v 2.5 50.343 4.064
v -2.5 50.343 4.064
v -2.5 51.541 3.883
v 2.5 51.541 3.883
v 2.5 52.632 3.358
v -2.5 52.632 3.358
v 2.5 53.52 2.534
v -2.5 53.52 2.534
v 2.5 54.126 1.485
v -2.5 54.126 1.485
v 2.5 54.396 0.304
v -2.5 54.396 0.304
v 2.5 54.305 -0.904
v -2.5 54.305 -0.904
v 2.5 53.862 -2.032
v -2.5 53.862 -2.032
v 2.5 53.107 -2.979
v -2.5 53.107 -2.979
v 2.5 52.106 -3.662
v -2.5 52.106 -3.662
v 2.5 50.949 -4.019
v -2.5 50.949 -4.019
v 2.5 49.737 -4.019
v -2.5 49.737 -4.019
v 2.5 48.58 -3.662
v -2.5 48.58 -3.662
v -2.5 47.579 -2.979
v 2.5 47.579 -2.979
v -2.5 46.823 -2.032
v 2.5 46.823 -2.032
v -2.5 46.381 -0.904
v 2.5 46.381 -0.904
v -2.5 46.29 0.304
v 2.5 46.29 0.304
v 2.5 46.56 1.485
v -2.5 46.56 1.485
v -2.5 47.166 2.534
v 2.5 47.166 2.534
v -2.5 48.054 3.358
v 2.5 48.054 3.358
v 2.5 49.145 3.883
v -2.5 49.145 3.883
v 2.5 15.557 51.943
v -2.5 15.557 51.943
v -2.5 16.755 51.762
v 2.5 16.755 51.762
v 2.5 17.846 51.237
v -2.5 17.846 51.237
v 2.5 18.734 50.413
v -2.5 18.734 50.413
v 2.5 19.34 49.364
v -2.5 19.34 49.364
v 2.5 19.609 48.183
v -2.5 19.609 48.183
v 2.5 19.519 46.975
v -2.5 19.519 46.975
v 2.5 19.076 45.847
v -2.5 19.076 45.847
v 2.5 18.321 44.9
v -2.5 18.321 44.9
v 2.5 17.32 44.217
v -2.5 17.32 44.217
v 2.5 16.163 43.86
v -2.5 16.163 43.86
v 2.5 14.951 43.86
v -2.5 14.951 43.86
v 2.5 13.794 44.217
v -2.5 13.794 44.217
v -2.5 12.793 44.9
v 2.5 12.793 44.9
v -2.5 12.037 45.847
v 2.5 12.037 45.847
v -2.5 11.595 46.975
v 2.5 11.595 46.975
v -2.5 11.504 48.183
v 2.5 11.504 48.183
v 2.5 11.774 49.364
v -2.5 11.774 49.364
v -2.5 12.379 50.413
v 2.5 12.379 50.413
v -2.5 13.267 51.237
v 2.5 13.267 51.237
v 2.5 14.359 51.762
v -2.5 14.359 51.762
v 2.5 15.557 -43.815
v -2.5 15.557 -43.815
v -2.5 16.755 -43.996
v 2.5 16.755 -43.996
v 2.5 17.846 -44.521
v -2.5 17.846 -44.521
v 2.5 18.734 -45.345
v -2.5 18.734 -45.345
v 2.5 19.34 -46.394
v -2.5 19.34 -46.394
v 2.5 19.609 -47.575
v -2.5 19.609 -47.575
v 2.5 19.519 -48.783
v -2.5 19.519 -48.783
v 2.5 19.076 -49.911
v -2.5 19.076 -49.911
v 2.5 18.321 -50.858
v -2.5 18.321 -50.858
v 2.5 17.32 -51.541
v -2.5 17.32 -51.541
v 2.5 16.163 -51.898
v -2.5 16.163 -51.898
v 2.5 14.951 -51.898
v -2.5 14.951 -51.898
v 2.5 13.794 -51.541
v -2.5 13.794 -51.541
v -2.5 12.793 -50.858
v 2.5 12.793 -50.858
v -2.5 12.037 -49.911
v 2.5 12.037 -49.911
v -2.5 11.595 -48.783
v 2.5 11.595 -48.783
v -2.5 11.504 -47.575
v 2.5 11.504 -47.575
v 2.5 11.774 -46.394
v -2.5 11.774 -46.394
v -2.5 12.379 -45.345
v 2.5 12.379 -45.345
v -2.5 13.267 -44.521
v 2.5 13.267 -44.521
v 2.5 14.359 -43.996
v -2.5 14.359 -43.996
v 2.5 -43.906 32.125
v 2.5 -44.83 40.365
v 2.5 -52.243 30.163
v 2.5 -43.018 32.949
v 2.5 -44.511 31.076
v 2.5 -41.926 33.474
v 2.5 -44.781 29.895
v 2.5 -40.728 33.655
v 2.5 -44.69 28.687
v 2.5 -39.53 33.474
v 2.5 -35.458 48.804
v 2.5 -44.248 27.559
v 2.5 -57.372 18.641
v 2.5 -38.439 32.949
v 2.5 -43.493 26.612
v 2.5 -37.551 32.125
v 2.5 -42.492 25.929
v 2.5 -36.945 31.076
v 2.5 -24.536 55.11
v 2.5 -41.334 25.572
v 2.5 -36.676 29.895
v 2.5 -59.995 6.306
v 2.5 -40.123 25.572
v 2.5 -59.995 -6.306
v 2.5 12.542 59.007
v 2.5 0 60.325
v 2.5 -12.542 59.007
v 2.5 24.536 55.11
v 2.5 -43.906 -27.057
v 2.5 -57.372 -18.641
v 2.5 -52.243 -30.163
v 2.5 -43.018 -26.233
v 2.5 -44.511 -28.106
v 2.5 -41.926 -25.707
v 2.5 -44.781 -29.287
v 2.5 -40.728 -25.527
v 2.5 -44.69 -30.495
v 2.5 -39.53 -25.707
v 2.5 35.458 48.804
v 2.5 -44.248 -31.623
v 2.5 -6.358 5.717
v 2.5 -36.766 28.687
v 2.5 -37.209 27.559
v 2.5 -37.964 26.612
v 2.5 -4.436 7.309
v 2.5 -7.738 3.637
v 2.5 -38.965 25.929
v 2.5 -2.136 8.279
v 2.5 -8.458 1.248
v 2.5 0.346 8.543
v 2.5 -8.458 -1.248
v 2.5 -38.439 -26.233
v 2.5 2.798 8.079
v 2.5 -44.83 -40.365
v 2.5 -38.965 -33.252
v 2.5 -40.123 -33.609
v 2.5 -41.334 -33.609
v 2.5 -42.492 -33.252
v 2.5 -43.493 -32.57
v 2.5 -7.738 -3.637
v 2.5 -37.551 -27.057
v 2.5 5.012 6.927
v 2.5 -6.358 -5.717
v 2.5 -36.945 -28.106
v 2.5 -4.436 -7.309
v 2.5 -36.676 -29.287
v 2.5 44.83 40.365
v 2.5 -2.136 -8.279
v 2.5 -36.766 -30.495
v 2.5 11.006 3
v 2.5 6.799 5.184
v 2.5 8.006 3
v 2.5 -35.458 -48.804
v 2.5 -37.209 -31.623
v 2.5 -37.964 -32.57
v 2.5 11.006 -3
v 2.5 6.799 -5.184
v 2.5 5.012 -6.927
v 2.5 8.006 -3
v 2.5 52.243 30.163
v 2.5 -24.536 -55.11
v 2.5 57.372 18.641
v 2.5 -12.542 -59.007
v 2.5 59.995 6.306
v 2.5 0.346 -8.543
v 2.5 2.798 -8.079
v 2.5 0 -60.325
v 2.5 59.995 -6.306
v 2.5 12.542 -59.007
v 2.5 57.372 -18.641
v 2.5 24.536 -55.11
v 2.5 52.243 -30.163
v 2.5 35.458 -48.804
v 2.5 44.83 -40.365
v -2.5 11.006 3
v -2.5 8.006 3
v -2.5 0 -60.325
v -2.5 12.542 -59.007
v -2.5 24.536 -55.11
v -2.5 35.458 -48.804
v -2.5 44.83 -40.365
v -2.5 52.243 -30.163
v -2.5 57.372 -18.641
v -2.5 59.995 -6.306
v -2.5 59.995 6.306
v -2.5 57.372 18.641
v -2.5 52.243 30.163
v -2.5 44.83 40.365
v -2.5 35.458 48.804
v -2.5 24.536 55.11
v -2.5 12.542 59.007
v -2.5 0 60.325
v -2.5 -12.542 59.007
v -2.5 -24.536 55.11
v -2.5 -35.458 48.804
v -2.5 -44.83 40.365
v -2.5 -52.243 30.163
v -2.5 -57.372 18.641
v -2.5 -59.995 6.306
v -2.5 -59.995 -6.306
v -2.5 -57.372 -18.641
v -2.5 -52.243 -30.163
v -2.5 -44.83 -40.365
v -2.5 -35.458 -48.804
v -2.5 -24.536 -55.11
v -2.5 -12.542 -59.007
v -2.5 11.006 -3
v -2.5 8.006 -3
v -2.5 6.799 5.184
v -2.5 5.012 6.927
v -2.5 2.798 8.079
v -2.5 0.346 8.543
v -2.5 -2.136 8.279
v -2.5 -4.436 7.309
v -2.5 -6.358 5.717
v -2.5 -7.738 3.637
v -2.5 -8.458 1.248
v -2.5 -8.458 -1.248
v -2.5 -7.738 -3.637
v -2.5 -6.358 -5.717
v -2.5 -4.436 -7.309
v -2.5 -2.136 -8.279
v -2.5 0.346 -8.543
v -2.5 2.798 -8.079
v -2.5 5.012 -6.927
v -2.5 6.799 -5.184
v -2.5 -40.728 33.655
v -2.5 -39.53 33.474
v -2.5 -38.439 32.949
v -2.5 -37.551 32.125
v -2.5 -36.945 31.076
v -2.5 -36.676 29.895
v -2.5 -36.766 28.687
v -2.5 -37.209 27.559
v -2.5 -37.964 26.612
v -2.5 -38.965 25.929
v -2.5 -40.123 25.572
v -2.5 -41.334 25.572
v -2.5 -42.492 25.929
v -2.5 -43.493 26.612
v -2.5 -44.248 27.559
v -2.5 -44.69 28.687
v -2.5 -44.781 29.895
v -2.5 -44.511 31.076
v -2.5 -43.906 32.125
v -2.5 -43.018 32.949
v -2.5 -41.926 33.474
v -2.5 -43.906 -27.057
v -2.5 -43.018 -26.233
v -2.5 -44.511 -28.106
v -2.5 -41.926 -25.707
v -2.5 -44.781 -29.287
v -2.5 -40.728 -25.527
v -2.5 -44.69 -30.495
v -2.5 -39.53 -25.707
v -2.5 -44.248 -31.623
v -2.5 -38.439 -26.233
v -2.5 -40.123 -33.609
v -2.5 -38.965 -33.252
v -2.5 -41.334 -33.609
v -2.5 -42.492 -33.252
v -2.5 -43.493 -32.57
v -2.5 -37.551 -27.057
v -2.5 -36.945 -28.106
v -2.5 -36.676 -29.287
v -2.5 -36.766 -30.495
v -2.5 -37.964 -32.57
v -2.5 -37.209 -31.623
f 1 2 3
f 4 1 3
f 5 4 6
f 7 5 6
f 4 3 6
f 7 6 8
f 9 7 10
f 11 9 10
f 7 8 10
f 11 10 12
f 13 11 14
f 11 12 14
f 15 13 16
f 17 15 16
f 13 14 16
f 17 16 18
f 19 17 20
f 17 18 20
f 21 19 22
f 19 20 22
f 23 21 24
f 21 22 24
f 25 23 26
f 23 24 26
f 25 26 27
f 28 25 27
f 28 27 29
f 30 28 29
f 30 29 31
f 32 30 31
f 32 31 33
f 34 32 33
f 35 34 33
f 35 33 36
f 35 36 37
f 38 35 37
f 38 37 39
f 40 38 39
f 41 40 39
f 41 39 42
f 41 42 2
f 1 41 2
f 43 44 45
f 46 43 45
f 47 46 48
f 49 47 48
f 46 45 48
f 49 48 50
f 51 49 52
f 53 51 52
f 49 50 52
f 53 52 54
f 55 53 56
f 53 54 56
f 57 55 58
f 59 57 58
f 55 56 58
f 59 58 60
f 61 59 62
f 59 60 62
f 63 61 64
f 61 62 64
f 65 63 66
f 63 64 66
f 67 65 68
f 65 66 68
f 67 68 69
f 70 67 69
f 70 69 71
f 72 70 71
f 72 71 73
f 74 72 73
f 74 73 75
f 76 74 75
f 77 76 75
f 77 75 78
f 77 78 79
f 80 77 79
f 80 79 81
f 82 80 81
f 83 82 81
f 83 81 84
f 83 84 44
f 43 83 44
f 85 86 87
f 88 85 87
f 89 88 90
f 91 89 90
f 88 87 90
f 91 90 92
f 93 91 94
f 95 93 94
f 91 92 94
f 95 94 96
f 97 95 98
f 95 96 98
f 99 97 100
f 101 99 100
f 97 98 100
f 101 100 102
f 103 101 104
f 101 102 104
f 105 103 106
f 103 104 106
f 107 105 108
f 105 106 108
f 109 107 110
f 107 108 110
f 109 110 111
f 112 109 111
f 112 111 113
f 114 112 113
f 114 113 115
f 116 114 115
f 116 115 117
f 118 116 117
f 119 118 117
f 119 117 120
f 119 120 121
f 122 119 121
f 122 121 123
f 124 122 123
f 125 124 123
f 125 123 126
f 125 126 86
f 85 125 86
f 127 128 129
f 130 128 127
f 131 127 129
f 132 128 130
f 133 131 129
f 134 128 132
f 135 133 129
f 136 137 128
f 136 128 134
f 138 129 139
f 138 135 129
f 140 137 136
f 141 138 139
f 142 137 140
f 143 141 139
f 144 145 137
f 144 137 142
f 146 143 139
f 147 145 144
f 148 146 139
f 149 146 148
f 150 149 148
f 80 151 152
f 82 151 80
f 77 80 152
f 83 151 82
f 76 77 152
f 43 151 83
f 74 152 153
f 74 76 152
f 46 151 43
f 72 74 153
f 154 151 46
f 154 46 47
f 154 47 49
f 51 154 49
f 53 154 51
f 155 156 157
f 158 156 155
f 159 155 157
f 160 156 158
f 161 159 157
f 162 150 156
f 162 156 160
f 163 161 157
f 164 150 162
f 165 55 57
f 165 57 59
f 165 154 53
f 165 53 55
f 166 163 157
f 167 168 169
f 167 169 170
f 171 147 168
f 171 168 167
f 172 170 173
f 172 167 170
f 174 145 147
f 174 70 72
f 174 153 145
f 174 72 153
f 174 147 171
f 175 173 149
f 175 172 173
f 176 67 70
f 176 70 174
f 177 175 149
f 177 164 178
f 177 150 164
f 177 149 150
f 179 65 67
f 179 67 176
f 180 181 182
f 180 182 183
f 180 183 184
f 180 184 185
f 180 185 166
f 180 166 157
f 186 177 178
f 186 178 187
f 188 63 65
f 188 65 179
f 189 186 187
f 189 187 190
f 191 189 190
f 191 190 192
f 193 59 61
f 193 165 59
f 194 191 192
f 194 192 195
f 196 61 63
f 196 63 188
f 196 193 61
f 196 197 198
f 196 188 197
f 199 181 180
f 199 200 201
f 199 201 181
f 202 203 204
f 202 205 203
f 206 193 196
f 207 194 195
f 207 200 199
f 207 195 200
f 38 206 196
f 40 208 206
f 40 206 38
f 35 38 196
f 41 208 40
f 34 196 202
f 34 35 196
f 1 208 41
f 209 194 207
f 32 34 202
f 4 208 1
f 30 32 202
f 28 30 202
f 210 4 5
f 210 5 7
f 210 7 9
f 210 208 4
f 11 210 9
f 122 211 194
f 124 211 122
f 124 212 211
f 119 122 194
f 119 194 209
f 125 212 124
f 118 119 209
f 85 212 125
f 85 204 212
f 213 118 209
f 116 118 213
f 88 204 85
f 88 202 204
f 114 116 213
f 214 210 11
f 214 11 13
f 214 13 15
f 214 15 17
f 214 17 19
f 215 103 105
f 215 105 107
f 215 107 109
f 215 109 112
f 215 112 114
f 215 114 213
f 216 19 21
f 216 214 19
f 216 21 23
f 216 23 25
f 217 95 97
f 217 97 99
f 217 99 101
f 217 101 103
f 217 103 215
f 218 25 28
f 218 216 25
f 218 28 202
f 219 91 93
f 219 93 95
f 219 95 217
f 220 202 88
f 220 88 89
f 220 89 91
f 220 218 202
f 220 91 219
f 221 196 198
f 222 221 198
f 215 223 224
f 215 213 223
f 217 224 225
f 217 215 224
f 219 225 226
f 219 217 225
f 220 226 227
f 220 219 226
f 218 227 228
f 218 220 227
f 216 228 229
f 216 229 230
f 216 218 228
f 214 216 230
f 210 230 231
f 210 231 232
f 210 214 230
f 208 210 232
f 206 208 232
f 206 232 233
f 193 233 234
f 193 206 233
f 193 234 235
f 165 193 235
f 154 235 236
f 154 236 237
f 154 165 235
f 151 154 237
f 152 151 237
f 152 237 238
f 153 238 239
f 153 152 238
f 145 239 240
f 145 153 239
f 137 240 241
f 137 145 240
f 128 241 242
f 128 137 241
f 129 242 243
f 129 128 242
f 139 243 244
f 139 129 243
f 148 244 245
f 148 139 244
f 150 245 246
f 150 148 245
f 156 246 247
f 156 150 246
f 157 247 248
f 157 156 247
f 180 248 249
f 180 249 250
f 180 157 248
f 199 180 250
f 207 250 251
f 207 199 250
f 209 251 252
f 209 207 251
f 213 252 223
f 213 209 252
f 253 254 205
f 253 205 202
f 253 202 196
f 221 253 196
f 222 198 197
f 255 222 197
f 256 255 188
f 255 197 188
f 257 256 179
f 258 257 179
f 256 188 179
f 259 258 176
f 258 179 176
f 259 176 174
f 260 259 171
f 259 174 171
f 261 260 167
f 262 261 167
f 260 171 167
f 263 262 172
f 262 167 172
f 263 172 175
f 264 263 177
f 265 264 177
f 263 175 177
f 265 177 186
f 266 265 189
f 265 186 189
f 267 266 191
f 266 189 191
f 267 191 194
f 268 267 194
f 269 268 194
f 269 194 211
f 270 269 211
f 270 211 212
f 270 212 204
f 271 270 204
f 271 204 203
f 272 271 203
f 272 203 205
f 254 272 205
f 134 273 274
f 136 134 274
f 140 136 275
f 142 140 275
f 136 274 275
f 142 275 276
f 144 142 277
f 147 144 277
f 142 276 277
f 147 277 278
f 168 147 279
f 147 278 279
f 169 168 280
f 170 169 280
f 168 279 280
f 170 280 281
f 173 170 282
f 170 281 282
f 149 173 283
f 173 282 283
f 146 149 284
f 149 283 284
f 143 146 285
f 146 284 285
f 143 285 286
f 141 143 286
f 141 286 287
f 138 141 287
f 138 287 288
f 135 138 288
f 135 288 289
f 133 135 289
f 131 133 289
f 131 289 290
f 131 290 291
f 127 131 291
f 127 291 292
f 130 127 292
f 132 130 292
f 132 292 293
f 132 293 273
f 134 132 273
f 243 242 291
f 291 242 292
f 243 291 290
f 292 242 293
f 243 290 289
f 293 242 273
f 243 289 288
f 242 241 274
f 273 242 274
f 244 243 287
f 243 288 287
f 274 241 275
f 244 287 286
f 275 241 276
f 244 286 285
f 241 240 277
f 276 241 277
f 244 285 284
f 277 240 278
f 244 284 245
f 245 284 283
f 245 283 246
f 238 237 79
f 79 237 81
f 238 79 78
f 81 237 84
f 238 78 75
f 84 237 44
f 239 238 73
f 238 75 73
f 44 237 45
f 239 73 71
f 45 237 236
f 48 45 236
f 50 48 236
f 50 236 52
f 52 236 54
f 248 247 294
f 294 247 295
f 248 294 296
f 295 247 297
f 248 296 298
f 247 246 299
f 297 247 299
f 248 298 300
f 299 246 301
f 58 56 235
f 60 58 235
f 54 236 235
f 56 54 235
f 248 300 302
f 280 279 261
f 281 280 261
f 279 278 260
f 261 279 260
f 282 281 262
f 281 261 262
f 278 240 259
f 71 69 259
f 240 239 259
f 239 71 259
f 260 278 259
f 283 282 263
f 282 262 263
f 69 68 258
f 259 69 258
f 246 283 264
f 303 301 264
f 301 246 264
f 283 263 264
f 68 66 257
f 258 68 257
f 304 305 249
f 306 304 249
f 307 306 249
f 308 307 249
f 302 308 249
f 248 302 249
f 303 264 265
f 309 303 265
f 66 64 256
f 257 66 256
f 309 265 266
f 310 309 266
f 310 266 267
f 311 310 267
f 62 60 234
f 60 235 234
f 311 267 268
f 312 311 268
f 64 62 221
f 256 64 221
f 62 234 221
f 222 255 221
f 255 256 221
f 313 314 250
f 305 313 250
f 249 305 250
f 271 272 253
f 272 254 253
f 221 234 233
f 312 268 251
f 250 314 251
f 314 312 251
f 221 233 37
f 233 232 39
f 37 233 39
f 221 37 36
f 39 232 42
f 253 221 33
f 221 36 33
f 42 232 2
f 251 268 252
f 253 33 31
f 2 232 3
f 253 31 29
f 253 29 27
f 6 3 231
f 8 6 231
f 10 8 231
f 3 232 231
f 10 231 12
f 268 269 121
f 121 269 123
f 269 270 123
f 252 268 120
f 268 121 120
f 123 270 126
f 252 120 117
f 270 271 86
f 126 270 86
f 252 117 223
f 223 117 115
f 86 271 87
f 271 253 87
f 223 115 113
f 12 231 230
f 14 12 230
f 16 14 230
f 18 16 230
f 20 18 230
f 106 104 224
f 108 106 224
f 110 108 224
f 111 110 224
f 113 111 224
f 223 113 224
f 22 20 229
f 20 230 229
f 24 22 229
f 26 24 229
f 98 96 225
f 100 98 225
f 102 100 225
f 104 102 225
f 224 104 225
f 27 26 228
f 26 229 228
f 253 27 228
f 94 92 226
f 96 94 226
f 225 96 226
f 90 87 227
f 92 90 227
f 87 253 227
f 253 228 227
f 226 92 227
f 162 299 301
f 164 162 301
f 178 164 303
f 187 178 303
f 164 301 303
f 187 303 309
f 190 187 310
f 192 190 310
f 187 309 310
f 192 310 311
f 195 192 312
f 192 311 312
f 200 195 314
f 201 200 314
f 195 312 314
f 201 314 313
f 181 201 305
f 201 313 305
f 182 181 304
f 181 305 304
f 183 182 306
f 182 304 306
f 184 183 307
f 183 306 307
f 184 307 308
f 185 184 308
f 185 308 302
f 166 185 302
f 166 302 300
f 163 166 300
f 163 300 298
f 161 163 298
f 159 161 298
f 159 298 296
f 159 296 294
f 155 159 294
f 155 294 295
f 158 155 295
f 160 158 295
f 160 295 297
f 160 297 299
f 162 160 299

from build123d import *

# Parameters (mm, degrees)
SKETCH1_R           = 60.325
BOSS_EXTRUDE1_DEPTH = 2.5
SKETCH2_R           = 4.064
CUT_EXTRUDE1_DEPTH  = 86.458827806
CUT_EXTRUDE4_DEPTH  = 86.458827806


with BuildPart() as part:
    # Sketch1 → Boss-Extrude1 (new, symmetric)
    with BuildSketch(Plane(origin=(0, 0, 0), x_dir=(0, 0, -1), z_dir=(1, 0, 0))):
        Circle(SKETCH1_R)
    extrude(amount=BOSS_EXTRUDE1_DEPTH, both=True)

    # Sketch2 → Cut-Extrude1 (cut, through all)
    with BuildSketch(Plane.ZY.offset(2.5)):
        with Locations((0, 50.342959834)):
            Circle(SKETCH2_R)
        with Locations((47.879, 15.556830136)):
            Circle(SKETCH2_R)
        with Locations((29.590849347, -40.728310053)):
            Circle(SKETCH2_R)
        with Locations((-29.590849347, -40.728310053)):
            Circle(SKETCH2_R)
        with Locations((-47.879, 15.556830136)):
            Circle(SKETCH2_R)
    extrude(amount=-CUT_EXTRUDE1_DEPTH, mode=Mode.SUBTRACT)

    # Sketch8 → Cut-Extrude4 (cut, through all)
    with BuildSketch(Plane(origin=(2.5, 0, 0), x_dir=(0, 0, -1), z_dir=(1, 0, 0))):
        with BuildLine():
            Line((0, 11.006403687), (-3, 11.006403687))
            Line((-3, 11.006403687), (-3, 8.006403687))
            ThreePointArc((-3, 8.006403687), (0, -8.55), (3, 8.006403687))
            Line((3, 8.006403687), (3, 11.006403687))
            Line((3, 11.006403687), (0, 11.006403687))
        make_face()
    extrude(amount=-CUT_EXTRUDE4_DEPTH, mode=Mode.SUBTRACT)


solid = part.part
